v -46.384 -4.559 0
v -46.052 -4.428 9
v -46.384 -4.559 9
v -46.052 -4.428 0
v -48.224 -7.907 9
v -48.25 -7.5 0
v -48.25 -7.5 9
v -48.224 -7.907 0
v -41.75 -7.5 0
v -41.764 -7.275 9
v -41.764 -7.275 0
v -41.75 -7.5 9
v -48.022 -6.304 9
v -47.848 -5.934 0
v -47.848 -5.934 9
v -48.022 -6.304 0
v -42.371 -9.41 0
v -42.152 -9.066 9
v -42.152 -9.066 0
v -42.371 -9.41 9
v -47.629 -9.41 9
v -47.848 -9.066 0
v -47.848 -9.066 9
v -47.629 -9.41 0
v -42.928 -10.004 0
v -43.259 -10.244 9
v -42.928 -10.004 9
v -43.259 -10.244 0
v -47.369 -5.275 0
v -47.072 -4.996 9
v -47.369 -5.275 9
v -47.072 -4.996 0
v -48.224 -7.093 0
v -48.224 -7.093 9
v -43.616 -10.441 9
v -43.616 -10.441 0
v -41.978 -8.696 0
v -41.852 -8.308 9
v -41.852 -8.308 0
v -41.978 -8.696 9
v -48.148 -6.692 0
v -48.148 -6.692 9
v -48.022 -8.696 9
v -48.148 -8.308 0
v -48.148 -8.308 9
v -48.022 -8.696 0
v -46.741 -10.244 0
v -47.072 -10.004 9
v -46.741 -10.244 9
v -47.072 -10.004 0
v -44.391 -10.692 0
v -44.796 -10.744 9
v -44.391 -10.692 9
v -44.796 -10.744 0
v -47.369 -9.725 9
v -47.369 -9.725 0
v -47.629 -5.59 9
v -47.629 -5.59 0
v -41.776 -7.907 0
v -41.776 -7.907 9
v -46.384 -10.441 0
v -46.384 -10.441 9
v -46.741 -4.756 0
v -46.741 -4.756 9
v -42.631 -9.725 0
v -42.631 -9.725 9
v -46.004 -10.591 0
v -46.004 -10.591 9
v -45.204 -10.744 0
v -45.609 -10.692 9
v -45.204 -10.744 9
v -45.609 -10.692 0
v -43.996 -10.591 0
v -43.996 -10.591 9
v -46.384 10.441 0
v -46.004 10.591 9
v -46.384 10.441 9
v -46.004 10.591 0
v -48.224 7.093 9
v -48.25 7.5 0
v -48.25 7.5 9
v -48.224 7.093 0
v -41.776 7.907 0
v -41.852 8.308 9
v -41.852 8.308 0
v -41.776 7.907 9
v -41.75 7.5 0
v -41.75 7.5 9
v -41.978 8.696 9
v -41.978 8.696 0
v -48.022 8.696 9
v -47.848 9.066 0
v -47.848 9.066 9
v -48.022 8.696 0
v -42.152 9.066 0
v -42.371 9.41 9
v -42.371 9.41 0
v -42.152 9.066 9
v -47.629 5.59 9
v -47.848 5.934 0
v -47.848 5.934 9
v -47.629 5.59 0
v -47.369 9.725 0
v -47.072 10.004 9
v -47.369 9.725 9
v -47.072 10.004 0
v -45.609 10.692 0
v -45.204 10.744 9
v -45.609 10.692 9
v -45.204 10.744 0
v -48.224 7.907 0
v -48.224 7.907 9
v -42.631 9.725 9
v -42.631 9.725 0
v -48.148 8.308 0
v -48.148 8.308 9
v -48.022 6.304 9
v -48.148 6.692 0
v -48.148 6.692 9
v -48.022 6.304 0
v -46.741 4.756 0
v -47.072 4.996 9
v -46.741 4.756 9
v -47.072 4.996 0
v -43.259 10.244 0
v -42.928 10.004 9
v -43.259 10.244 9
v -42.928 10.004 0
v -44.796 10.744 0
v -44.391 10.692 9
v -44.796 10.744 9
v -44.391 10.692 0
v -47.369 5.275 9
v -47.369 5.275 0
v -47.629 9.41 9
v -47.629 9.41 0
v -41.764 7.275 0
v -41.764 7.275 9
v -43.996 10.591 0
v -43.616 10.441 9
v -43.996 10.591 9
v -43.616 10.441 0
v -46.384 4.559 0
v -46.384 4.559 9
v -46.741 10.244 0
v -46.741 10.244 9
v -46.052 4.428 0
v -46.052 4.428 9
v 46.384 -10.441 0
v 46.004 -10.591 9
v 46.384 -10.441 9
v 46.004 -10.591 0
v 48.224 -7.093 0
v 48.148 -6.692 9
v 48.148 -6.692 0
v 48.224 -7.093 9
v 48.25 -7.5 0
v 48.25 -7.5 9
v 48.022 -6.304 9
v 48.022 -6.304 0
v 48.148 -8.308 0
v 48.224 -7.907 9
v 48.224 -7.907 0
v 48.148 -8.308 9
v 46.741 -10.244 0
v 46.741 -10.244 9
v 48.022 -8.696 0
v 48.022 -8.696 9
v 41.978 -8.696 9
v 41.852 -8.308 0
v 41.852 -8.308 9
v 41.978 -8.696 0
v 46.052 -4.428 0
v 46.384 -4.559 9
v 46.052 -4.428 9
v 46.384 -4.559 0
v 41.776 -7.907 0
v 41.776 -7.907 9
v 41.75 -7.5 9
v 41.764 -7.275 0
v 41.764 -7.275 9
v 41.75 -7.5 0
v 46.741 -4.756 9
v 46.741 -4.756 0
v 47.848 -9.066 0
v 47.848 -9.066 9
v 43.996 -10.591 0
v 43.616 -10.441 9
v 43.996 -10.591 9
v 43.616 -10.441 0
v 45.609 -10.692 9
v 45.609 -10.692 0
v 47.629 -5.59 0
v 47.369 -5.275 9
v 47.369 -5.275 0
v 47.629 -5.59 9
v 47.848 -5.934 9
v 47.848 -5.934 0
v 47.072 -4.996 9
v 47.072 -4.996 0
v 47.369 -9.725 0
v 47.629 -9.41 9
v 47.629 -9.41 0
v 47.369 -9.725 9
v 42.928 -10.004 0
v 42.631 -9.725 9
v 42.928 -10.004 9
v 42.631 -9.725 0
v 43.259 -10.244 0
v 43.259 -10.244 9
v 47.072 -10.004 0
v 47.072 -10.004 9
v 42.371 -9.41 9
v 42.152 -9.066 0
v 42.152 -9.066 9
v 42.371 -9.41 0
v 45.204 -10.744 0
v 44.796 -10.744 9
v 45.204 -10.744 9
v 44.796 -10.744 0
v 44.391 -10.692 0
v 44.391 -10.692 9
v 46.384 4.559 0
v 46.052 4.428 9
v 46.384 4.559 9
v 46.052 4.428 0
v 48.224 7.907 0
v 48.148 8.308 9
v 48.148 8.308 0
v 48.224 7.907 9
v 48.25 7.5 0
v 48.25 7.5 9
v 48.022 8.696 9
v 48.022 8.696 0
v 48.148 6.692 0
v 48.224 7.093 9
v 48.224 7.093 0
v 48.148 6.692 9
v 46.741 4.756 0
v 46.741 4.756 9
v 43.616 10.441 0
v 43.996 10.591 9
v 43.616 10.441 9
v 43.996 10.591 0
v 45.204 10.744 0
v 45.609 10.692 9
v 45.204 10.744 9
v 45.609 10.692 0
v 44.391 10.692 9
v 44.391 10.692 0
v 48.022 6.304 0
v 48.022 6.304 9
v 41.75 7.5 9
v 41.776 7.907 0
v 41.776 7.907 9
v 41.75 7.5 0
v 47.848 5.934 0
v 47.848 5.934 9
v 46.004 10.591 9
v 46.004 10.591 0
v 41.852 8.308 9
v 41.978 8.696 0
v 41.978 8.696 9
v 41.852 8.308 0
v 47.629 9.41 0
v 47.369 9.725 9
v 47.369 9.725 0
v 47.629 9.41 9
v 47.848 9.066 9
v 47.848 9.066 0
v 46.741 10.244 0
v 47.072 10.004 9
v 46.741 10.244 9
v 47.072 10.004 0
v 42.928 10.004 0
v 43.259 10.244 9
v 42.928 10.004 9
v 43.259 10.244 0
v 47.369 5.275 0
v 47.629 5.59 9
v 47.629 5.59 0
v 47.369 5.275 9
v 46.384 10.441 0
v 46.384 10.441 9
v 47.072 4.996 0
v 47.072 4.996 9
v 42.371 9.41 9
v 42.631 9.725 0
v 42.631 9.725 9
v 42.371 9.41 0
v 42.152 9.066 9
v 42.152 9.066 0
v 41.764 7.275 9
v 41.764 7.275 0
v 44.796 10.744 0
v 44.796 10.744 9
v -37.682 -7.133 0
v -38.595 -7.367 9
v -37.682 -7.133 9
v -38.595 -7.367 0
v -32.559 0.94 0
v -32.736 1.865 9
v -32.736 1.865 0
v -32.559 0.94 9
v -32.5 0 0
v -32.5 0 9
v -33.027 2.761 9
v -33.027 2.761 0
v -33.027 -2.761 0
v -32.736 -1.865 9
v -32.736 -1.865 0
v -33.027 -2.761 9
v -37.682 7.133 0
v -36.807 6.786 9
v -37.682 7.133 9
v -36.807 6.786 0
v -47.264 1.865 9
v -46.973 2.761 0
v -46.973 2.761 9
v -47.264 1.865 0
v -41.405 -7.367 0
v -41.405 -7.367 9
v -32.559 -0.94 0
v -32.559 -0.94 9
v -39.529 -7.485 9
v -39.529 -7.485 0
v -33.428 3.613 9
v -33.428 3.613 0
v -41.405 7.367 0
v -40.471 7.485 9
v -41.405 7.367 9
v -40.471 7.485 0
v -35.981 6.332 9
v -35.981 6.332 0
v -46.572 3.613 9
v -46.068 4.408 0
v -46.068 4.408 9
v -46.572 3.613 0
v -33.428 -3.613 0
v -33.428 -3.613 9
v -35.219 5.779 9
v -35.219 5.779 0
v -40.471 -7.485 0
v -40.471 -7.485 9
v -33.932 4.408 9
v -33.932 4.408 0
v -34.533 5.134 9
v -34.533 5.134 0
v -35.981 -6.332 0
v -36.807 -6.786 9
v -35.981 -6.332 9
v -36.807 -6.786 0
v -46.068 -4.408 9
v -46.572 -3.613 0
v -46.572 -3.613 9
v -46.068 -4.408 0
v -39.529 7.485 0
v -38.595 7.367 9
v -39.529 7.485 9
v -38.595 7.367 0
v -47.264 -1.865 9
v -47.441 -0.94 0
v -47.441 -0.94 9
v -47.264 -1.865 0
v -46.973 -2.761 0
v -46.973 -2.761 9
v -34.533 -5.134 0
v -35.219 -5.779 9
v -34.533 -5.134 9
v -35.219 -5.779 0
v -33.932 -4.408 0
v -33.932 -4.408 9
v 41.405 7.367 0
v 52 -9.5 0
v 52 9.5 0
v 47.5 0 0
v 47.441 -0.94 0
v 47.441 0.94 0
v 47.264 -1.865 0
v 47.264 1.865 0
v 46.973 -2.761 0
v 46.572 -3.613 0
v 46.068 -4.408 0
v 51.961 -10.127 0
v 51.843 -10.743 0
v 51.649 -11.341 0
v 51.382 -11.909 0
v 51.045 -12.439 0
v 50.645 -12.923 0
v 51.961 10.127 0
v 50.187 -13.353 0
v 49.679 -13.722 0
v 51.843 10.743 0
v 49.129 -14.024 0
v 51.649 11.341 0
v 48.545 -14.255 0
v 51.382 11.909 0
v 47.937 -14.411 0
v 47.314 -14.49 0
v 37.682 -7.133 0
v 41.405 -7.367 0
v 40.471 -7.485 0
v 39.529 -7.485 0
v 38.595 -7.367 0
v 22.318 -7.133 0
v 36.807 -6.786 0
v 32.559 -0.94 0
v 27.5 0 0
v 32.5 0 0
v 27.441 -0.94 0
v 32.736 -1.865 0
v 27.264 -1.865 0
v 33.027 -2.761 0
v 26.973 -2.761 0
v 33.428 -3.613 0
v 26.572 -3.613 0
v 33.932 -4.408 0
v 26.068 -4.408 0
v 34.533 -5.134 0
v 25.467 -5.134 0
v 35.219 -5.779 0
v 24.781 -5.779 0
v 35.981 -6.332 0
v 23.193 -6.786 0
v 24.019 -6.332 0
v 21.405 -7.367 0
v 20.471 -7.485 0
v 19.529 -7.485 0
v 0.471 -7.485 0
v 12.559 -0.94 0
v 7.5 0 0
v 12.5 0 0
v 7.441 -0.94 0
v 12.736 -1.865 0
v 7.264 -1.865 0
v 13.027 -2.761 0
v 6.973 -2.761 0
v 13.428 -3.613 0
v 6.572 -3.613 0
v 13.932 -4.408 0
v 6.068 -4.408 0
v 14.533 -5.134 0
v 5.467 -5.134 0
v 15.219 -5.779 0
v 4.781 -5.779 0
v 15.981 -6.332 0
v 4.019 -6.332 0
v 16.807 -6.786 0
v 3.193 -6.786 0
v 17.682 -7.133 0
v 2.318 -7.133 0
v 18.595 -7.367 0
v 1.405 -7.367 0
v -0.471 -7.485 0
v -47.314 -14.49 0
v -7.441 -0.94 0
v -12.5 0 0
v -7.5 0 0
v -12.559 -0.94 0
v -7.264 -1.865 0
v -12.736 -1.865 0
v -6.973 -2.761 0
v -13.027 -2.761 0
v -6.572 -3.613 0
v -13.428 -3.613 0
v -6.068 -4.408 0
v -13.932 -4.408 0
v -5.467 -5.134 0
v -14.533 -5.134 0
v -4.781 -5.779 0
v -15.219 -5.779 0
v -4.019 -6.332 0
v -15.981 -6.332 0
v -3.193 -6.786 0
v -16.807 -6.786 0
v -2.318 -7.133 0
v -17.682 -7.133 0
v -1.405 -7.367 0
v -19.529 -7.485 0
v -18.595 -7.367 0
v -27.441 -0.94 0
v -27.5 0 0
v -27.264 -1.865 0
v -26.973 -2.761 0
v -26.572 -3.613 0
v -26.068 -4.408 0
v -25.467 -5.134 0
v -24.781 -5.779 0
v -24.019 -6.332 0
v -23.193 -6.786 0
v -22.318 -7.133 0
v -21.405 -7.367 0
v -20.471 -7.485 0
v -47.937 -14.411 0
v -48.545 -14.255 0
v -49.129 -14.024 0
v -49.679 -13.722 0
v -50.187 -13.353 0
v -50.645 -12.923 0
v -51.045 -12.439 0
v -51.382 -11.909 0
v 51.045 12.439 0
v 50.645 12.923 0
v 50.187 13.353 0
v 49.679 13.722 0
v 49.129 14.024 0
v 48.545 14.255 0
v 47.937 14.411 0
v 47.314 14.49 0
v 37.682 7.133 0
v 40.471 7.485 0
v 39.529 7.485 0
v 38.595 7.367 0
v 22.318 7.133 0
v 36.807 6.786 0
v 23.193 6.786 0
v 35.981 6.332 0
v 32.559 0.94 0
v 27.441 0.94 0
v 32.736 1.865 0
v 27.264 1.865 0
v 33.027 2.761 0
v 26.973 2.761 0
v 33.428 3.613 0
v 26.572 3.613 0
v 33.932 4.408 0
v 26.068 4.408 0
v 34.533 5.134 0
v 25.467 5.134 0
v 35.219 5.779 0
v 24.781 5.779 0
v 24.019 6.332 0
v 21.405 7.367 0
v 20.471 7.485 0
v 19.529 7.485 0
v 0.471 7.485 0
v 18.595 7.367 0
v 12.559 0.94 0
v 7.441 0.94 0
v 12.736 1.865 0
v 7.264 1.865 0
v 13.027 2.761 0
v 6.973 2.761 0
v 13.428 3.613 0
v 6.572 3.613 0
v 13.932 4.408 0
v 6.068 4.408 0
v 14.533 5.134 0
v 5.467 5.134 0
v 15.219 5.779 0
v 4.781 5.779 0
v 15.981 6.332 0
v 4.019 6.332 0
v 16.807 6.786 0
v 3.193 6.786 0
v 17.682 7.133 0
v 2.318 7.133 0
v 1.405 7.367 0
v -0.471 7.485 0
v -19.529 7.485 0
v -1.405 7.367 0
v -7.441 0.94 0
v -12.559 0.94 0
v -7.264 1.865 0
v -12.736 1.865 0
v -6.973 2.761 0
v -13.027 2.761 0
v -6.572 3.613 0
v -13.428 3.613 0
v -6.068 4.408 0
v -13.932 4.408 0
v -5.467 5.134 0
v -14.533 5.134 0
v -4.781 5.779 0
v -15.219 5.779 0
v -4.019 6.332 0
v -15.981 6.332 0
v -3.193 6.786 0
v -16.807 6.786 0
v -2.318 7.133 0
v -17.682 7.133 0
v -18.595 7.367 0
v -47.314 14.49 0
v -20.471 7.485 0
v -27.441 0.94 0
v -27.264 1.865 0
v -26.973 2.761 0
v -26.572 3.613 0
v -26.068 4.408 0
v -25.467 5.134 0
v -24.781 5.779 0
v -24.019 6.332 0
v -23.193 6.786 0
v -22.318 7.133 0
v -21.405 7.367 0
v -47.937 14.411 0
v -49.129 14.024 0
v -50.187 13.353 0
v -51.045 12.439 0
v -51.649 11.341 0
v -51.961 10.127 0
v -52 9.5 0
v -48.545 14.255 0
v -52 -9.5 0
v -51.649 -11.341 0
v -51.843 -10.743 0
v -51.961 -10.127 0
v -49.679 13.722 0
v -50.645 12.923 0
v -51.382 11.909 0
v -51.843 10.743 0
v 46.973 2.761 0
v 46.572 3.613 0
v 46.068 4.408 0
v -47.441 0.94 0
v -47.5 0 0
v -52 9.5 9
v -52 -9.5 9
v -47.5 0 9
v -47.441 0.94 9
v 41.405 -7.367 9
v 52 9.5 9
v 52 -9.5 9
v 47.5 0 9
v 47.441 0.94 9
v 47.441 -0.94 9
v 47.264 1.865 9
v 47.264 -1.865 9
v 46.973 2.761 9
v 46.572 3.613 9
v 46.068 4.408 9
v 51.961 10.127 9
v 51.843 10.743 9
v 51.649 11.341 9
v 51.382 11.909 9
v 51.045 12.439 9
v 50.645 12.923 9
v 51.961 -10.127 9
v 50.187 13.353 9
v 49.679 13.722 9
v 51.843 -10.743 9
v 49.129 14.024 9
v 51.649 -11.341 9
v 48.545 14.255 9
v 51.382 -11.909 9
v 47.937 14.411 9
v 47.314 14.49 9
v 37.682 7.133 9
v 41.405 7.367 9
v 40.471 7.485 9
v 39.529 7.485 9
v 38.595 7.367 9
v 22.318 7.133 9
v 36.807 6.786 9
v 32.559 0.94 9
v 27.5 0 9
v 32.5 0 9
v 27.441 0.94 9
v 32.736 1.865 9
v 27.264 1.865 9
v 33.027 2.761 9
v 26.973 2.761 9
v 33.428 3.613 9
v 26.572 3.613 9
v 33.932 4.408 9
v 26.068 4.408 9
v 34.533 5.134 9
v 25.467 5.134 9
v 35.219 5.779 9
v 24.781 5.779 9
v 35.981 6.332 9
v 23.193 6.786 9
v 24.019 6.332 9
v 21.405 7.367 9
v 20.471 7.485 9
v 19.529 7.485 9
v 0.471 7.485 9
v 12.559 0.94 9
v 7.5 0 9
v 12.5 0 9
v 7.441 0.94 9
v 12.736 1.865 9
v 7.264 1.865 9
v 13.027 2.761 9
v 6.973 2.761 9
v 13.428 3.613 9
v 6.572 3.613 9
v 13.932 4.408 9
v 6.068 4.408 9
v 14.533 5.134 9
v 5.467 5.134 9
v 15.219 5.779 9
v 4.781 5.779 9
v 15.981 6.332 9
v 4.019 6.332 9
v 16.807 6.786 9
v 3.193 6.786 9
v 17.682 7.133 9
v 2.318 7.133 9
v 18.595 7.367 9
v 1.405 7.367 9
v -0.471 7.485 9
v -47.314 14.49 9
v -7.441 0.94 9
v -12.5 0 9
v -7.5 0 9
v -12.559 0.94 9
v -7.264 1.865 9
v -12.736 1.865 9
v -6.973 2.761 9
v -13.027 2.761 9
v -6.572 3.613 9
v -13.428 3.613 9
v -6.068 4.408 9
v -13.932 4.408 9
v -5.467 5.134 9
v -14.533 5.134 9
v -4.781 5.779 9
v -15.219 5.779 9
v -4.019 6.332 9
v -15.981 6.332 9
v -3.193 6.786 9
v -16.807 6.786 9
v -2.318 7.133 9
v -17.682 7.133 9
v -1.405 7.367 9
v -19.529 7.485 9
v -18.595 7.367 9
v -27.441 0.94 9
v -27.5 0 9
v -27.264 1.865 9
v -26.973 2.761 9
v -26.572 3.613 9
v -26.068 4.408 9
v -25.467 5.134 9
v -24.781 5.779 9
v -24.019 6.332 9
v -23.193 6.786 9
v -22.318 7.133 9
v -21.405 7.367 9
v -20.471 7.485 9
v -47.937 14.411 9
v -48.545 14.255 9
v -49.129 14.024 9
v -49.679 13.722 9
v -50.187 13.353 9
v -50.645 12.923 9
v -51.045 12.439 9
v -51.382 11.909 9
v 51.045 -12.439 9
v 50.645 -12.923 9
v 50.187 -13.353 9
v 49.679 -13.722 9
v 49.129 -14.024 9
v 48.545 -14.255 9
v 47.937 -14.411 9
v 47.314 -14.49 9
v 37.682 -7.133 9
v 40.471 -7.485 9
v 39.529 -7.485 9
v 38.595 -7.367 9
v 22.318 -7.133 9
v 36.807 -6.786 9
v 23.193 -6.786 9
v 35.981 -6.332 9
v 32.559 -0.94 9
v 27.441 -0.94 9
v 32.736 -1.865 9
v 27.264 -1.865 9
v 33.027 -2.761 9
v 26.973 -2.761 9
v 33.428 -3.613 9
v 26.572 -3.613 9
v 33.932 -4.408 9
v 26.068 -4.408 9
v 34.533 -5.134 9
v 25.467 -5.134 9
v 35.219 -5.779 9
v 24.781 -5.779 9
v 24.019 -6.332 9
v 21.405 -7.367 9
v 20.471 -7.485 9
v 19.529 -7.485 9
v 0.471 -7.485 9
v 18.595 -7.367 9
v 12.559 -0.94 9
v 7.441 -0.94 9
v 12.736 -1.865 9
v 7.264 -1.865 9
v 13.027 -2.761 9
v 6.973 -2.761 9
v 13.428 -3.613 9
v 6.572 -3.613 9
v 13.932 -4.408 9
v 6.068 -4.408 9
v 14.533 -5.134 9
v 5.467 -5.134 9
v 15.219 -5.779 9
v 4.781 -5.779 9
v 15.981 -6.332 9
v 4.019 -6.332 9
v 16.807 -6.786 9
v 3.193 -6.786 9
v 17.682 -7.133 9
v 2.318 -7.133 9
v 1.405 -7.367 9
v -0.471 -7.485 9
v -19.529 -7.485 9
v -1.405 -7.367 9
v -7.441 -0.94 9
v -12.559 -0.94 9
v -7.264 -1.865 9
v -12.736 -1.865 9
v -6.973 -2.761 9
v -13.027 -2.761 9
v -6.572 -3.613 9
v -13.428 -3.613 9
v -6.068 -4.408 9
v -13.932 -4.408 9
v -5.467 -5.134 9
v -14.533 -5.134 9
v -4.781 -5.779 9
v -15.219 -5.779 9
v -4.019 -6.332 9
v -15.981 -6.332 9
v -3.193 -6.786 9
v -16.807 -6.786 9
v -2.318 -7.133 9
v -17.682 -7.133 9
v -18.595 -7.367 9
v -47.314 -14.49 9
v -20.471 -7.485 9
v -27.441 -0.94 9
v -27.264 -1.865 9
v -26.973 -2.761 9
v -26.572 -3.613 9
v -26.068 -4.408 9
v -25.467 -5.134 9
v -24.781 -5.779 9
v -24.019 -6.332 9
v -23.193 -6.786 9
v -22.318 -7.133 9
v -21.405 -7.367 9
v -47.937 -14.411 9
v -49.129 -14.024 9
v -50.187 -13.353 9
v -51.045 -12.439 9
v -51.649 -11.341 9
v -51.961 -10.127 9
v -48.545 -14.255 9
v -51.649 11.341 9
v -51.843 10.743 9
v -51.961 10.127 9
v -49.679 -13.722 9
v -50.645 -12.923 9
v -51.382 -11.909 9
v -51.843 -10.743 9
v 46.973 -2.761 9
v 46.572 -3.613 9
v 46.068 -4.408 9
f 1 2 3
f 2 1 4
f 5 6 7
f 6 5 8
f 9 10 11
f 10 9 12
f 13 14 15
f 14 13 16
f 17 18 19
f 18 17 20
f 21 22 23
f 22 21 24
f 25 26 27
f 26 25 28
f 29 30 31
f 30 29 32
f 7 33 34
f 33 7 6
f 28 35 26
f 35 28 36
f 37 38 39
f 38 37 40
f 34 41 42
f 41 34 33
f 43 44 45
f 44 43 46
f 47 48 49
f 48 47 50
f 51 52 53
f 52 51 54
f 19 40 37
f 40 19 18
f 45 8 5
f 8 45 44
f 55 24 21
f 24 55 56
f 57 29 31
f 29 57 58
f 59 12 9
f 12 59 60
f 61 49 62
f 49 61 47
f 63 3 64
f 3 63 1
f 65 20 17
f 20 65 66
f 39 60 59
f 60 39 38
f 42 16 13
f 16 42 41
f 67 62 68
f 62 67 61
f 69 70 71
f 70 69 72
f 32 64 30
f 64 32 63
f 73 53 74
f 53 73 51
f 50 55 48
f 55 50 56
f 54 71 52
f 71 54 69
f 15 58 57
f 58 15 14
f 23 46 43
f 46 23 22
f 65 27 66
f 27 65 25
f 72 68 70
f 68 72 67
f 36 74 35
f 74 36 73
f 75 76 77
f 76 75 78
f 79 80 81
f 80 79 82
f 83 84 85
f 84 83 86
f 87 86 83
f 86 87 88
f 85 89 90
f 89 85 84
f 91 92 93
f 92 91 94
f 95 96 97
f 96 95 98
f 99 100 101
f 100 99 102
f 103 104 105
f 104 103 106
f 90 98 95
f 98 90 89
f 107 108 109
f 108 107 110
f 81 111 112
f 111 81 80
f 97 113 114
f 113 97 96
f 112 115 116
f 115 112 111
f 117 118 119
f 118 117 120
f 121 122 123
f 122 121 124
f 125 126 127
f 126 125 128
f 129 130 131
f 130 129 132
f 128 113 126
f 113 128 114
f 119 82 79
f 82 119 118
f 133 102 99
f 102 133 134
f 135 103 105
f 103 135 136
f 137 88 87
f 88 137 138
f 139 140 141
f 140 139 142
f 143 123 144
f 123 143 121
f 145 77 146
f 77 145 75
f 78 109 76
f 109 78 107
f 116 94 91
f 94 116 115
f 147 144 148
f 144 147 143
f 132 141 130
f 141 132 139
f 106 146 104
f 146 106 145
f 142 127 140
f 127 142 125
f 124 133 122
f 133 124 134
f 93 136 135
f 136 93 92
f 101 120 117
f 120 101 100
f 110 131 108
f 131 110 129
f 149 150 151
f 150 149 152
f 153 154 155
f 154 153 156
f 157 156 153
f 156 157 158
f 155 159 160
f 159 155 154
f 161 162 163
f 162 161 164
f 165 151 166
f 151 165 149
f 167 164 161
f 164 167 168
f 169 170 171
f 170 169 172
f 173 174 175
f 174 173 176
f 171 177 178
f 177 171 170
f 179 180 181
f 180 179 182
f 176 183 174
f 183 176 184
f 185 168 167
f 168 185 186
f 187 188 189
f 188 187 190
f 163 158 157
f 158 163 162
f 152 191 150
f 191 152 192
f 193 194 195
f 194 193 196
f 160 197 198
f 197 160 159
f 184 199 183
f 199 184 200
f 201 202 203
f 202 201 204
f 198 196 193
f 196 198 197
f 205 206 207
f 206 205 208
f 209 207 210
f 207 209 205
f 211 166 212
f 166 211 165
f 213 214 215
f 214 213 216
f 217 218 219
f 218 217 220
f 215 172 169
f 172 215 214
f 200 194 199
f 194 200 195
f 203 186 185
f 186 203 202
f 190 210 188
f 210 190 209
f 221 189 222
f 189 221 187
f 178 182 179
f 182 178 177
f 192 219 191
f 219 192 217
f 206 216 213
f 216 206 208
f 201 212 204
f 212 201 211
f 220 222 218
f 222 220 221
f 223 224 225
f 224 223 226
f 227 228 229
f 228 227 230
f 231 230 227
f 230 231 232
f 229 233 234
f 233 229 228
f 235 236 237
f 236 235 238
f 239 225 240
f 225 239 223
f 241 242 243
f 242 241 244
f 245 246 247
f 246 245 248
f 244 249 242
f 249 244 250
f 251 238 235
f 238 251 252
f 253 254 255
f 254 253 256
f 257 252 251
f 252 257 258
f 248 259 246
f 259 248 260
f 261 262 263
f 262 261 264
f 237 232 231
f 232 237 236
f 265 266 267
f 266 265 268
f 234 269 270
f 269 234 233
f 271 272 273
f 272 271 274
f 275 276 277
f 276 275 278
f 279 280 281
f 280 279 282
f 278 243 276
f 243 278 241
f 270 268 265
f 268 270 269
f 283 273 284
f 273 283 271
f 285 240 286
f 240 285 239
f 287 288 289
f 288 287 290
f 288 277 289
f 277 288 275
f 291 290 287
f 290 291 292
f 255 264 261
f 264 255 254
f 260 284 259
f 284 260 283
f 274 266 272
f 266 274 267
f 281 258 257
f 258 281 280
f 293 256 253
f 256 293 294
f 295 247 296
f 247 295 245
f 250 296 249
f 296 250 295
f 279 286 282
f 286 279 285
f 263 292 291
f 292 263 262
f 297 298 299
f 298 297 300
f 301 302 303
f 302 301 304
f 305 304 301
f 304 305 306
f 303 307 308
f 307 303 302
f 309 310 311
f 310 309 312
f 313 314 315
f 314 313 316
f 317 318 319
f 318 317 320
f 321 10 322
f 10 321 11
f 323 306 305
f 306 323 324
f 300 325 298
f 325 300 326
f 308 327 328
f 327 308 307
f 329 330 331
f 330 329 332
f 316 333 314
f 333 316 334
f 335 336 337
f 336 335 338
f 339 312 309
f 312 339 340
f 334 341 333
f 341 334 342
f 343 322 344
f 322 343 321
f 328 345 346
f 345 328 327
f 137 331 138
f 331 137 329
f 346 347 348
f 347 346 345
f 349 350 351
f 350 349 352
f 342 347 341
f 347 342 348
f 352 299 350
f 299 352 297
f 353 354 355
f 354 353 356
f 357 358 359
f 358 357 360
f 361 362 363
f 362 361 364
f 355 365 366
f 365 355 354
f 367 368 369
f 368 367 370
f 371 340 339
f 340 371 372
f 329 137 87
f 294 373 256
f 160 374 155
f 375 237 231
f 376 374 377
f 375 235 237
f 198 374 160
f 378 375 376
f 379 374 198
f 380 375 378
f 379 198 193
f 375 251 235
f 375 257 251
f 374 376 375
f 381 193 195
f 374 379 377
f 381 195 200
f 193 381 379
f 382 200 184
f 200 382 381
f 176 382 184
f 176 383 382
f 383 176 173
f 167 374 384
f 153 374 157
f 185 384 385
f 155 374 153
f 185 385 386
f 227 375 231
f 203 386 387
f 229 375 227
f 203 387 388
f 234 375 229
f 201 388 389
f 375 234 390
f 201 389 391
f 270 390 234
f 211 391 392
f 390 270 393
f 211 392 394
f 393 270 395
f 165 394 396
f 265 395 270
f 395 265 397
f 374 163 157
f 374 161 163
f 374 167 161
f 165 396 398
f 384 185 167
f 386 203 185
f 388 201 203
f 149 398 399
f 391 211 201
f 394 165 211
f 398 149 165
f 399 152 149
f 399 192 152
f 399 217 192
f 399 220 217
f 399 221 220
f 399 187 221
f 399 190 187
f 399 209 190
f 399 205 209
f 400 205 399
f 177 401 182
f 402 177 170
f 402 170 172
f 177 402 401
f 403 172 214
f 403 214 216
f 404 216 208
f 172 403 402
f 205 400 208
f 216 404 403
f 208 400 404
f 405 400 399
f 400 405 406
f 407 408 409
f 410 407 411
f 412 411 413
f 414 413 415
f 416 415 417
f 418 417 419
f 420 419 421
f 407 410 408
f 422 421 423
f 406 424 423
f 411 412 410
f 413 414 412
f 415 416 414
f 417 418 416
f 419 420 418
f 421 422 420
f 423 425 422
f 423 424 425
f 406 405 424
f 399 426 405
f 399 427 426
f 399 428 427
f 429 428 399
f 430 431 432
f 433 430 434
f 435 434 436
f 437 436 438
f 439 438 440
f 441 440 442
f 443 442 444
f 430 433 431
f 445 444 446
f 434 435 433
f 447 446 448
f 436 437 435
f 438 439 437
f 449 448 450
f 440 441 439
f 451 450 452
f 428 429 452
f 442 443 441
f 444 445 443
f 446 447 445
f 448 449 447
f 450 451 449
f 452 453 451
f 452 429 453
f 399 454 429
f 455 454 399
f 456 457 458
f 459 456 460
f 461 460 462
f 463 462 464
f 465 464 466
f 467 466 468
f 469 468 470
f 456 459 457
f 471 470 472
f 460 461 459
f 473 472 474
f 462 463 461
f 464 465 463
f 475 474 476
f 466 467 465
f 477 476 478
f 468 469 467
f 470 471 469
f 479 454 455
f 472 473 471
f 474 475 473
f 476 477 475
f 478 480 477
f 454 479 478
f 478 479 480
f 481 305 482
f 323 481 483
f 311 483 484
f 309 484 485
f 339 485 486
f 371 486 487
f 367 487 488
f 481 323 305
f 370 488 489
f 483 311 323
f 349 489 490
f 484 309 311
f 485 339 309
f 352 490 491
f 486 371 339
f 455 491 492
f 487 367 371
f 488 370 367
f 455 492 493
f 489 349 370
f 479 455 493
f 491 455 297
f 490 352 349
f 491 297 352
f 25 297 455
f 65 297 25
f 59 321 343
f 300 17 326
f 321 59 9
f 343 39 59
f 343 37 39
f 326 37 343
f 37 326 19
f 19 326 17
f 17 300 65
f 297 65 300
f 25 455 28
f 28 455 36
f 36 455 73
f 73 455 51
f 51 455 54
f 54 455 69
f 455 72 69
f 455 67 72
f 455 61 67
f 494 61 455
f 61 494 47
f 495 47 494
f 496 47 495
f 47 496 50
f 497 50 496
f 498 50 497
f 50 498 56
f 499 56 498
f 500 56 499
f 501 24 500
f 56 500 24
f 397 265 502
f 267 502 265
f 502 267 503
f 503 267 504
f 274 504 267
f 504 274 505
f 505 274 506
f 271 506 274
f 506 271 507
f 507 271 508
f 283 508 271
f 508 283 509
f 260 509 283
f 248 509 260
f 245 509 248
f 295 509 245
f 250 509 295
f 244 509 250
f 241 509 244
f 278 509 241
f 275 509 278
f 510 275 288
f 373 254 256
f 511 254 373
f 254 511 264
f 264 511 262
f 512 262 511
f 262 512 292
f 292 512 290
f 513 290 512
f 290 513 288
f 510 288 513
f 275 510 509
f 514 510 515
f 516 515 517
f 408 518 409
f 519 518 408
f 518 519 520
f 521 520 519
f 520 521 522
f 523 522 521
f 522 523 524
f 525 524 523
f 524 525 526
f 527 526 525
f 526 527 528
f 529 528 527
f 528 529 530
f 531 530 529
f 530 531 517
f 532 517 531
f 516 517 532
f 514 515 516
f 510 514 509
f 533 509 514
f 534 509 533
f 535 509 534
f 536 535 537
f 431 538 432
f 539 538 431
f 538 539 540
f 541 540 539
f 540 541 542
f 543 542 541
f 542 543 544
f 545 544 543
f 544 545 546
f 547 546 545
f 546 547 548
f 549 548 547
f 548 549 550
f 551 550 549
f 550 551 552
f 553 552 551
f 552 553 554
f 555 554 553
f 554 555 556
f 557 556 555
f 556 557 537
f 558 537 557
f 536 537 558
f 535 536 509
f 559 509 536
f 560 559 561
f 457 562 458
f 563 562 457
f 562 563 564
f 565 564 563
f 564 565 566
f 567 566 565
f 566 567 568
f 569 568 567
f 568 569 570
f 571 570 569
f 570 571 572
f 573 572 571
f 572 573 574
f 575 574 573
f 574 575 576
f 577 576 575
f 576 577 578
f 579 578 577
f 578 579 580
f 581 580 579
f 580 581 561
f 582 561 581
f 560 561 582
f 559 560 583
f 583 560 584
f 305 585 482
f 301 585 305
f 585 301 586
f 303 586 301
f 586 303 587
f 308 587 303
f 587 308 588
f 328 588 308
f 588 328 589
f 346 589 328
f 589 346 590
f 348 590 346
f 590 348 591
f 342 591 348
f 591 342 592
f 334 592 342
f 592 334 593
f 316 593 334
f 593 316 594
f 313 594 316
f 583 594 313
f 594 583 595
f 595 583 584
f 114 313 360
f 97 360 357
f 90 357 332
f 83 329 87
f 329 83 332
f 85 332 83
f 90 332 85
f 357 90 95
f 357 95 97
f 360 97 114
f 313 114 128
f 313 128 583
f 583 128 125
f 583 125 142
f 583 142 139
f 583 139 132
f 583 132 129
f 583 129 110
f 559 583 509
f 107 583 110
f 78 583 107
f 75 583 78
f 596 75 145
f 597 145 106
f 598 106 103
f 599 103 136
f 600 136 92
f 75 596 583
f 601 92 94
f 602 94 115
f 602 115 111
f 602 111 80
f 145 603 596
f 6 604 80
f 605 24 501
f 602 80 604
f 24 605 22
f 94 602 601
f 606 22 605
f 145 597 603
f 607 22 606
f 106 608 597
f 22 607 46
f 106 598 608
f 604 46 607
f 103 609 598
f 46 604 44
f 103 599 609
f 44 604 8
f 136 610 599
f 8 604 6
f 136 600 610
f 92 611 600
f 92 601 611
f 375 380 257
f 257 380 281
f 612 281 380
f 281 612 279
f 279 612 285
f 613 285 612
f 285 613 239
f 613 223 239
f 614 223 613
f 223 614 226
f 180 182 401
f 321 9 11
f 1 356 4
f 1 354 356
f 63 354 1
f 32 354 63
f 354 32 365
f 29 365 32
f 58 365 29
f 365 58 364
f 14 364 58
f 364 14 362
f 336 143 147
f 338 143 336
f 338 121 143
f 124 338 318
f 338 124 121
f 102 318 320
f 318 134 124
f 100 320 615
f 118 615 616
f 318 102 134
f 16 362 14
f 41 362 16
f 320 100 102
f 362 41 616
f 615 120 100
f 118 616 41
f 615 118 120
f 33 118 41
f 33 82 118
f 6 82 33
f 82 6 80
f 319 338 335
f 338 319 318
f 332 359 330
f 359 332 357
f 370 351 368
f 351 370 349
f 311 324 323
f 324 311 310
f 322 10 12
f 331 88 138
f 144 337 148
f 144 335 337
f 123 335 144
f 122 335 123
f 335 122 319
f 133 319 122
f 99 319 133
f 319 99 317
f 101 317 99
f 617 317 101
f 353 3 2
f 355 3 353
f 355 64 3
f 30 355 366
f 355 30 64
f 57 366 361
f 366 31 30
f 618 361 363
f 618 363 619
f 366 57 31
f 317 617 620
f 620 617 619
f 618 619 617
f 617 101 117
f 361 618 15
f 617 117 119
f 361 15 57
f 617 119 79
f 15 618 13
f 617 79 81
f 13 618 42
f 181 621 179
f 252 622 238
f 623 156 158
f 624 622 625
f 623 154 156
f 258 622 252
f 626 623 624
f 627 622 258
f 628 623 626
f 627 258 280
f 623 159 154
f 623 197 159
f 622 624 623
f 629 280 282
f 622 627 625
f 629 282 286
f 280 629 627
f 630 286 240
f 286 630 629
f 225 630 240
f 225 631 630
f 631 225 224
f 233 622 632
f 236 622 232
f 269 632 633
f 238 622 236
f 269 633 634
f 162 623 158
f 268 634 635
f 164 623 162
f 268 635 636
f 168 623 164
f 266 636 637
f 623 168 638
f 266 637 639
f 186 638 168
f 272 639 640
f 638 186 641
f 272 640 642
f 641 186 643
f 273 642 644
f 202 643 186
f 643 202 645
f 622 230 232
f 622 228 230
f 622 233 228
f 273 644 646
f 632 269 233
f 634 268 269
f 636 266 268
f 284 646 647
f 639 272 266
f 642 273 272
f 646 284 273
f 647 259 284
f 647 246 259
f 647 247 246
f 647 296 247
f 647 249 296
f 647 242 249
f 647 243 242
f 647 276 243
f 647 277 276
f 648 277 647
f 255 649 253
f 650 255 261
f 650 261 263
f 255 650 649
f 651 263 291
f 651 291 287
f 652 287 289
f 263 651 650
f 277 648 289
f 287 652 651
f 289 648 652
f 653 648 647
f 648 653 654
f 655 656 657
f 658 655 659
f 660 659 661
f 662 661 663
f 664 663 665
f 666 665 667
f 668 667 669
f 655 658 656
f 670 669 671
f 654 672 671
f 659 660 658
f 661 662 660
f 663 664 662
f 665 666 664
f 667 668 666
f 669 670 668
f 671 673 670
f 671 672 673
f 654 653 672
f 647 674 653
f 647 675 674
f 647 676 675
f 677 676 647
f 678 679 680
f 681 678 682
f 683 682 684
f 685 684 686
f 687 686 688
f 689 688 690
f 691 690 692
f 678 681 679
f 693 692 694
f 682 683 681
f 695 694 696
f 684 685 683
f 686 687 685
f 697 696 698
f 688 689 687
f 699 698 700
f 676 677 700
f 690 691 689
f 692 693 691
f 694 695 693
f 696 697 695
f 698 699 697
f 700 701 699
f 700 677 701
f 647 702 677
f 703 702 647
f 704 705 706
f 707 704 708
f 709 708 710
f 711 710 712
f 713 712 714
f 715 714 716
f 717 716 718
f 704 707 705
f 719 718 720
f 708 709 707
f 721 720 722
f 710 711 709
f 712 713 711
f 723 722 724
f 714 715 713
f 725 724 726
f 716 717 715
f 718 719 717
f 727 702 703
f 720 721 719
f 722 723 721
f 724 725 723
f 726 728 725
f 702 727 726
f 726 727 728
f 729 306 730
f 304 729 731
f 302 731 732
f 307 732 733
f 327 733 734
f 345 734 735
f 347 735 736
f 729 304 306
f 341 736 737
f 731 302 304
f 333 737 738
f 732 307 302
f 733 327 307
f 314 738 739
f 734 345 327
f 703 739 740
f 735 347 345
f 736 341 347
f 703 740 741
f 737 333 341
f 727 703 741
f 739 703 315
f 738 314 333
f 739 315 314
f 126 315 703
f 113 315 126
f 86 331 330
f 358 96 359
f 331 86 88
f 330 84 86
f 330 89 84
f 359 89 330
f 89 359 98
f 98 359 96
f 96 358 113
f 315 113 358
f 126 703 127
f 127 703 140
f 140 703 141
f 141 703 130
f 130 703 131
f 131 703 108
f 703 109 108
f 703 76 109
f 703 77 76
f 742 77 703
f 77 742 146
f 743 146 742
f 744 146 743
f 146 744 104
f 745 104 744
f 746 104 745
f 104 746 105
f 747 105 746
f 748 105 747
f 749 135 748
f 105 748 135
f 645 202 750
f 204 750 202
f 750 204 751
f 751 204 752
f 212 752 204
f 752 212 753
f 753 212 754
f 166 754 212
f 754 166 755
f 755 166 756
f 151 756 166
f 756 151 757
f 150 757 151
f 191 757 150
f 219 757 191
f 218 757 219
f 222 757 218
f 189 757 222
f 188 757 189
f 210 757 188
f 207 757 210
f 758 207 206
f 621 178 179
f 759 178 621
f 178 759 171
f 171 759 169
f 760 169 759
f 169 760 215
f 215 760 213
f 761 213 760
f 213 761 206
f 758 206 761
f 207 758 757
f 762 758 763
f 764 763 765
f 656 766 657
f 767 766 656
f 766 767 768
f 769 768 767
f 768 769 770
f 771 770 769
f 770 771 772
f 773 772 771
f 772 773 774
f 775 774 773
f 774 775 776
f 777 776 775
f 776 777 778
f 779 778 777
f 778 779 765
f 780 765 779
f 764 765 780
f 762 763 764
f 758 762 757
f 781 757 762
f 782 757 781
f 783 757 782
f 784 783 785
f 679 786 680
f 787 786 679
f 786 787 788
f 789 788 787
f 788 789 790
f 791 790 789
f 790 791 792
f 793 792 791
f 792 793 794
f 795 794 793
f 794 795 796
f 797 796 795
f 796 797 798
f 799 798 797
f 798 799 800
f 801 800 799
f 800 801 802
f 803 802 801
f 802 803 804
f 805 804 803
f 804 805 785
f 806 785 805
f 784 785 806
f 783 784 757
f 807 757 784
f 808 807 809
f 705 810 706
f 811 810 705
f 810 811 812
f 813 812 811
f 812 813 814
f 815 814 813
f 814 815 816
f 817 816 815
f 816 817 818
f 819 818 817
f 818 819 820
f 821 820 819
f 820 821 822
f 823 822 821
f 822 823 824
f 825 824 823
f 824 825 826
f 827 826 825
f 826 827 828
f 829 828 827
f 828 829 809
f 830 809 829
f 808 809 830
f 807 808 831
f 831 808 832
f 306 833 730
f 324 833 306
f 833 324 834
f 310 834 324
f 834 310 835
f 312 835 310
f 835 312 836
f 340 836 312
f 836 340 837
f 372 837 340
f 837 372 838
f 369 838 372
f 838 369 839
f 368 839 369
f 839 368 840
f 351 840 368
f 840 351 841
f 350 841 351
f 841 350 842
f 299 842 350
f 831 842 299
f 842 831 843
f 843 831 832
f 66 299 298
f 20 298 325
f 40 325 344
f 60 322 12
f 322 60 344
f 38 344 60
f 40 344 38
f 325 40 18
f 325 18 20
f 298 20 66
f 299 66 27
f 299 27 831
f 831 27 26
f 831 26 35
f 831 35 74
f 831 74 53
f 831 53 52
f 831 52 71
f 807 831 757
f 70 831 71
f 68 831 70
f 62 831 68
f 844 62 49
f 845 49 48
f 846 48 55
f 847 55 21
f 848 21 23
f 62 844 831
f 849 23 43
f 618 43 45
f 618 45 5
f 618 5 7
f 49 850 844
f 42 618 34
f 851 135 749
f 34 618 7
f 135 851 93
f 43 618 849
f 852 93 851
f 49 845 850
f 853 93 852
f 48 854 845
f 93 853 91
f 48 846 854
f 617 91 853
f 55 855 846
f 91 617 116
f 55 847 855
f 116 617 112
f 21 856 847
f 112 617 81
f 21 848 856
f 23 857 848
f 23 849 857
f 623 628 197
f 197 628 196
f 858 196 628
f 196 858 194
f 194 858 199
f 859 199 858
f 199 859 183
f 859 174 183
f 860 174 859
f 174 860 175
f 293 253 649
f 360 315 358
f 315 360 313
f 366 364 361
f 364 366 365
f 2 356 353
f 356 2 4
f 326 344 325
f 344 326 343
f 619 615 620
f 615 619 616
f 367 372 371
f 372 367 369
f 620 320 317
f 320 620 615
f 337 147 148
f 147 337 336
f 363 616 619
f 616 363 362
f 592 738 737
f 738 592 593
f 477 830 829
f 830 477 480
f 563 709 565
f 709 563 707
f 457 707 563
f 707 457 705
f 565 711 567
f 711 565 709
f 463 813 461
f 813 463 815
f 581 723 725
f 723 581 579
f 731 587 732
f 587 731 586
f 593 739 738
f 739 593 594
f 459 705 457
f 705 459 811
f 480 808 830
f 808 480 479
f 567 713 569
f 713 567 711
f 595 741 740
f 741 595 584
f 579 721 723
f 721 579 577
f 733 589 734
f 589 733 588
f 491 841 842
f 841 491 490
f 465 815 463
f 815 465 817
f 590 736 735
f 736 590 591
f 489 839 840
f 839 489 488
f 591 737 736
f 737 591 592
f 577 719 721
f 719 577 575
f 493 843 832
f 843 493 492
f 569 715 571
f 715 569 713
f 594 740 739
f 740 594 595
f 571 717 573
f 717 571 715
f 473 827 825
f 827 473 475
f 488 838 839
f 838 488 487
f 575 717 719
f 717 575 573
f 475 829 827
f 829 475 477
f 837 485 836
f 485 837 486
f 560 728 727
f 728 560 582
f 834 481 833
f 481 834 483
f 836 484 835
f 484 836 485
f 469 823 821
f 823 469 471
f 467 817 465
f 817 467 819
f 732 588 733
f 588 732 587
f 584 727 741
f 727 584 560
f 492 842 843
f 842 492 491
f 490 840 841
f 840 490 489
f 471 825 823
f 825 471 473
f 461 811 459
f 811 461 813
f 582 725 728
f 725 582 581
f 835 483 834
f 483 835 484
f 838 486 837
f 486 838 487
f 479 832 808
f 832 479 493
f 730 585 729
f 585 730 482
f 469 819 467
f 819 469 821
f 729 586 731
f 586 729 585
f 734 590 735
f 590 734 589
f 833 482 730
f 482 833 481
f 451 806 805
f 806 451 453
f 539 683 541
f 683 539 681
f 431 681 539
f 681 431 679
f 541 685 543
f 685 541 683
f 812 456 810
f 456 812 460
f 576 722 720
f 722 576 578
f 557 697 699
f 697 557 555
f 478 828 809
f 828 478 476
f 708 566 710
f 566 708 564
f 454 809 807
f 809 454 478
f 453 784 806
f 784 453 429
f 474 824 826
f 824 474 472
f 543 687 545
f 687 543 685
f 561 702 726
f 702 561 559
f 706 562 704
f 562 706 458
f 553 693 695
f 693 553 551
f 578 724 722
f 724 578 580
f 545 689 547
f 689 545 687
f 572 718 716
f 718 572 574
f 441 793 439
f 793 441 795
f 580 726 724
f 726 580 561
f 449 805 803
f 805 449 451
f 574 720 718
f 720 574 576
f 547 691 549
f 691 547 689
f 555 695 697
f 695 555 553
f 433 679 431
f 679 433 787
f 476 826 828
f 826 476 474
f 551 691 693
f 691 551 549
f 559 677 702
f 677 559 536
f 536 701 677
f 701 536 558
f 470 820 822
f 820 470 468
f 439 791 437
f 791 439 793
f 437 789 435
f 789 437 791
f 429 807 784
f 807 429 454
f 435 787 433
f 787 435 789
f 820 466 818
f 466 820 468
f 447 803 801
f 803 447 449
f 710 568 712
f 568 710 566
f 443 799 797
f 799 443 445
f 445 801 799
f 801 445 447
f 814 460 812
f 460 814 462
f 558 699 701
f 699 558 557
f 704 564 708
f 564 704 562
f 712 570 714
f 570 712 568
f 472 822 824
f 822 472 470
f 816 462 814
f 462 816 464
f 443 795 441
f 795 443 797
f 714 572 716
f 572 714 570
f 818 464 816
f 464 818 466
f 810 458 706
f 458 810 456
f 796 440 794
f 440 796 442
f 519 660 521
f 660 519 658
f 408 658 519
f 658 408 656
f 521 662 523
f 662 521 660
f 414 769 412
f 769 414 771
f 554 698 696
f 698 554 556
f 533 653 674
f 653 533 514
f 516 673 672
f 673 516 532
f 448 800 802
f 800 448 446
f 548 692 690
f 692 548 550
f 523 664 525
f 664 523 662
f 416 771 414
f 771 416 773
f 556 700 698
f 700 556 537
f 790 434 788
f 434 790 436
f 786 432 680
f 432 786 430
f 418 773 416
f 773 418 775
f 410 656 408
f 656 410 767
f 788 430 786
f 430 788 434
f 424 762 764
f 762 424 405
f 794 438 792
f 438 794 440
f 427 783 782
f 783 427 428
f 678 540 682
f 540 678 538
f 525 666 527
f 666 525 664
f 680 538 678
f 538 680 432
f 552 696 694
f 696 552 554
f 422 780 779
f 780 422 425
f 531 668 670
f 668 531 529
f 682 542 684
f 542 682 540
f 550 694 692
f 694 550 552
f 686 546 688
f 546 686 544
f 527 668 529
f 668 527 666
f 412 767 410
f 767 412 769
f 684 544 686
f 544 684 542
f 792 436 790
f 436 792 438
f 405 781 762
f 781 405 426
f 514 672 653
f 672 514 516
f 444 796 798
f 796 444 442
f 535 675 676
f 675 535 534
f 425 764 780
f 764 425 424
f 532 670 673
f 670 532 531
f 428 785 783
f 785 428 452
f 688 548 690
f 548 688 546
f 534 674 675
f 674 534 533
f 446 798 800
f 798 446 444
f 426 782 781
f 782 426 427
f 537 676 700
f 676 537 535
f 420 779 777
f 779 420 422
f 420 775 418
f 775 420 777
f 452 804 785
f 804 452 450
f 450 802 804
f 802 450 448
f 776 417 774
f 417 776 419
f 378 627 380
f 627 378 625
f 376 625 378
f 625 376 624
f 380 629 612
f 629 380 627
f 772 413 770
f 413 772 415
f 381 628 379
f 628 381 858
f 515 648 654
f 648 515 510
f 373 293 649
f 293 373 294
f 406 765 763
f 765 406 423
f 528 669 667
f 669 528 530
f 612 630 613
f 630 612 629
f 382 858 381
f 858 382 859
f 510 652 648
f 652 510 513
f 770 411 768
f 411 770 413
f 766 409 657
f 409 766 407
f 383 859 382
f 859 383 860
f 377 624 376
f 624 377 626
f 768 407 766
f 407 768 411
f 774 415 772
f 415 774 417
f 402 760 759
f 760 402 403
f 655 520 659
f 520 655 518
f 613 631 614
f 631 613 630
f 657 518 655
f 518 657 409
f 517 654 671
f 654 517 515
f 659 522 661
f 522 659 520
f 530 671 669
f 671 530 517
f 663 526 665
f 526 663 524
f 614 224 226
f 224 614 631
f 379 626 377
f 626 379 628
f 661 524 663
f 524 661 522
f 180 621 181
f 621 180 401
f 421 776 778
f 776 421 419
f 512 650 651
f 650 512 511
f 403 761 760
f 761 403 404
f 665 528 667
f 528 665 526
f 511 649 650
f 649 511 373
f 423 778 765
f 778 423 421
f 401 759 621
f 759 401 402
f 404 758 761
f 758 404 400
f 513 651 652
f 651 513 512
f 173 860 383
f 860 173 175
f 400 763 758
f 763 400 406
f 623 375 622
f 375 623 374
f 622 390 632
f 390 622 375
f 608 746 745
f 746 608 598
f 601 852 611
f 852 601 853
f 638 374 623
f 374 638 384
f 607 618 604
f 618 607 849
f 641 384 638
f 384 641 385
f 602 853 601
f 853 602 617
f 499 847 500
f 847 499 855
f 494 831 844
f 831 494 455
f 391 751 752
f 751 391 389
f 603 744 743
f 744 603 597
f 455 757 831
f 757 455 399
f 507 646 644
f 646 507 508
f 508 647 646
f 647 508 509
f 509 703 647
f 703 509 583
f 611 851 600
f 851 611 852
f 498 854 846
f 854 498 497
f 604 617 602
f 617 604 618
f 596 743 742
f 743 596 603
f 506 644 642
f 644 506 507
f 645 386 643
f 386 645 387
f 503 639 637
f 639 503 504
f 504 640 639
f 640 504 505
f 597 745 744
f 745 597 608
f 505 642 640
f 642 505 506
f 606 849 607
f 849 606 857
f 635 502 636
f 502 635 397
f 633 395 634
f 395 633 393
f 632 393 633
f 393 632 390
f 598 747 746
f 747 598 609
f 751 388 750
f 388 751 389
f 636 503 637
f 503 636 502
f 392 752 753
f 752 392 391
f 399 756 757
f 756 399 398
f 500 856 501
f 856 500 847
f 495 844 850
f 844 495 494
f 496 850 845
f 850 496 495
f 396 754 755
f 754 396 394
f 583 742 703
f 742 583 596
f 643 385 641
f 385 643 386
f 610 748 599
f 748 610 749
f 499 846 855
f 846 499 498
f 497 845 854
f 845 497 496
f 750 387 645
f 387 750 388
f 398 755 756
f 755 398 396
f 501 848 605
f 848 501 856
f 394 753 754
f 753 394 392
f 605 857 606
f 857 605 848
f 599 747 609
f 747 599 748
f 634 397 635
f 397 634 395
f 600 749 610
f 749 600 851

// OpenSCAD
$fn = 50;


difference() {
	union() {
		hull() {
			translate(v = [-47.0000000000, 9.5000000000, 0]) {
				cylinder(h = 9, r = 5);
			}
			translate(v = [47.0000000000, 9.5000000000, 0]) {
				cylinder(h = 9, r = 5);
			}
			translate(v = [-47.0000000000, -9.5000000000, 0]) {
				cylinder(h = 9, r = 5);
			}
			translate(v = [47.0000000000, -9.5000000000, 0]) {
				cylinder(h = 9, r = 5);
			}
		}
	}
	union() {
		#translate(v = [-45.0000000000, -7.5000000000, -100.0000000000]) {
			cylinder(h = 200, r = 3.2500000000);
		}
		#translate(v = [-45.0000000000, 7.5000000000, -100.0000000000]) {
			cylinder(h = 200, r = 3.2500000000);
		}
		#translate(v = [45.0000000000, -7.5000000000, -100.0000000000]) {
			cylinder(h = 200, r = 3.2500000000);
		}
		#translate(v = [45.0000000000, 7.5000000000, -100.0000000000]) {
			cylinder(h = 200, r = 3.2500000000);
		}
		#translate(v = [-40.0000000000, 0, 0]) {
			cylinder(h = 9, r = 7.5000000000);
		}
		#translate(v = [-20.0000000000, 0, 0]) {
			cylinder(h = 9, r = 7.5000000000);
		}
		#cylinder(h = 9, r = 7.5000000000);
		#translate(v = [20.0000000000, 0, 0]) {
			cylinder(h = 9, r = 7.5000000000);
		}
		#translate(v = [40.0000000000, 0, 0]) {
			cylinder(h = 9, r = 7.5000000000);
		}
	}
}
